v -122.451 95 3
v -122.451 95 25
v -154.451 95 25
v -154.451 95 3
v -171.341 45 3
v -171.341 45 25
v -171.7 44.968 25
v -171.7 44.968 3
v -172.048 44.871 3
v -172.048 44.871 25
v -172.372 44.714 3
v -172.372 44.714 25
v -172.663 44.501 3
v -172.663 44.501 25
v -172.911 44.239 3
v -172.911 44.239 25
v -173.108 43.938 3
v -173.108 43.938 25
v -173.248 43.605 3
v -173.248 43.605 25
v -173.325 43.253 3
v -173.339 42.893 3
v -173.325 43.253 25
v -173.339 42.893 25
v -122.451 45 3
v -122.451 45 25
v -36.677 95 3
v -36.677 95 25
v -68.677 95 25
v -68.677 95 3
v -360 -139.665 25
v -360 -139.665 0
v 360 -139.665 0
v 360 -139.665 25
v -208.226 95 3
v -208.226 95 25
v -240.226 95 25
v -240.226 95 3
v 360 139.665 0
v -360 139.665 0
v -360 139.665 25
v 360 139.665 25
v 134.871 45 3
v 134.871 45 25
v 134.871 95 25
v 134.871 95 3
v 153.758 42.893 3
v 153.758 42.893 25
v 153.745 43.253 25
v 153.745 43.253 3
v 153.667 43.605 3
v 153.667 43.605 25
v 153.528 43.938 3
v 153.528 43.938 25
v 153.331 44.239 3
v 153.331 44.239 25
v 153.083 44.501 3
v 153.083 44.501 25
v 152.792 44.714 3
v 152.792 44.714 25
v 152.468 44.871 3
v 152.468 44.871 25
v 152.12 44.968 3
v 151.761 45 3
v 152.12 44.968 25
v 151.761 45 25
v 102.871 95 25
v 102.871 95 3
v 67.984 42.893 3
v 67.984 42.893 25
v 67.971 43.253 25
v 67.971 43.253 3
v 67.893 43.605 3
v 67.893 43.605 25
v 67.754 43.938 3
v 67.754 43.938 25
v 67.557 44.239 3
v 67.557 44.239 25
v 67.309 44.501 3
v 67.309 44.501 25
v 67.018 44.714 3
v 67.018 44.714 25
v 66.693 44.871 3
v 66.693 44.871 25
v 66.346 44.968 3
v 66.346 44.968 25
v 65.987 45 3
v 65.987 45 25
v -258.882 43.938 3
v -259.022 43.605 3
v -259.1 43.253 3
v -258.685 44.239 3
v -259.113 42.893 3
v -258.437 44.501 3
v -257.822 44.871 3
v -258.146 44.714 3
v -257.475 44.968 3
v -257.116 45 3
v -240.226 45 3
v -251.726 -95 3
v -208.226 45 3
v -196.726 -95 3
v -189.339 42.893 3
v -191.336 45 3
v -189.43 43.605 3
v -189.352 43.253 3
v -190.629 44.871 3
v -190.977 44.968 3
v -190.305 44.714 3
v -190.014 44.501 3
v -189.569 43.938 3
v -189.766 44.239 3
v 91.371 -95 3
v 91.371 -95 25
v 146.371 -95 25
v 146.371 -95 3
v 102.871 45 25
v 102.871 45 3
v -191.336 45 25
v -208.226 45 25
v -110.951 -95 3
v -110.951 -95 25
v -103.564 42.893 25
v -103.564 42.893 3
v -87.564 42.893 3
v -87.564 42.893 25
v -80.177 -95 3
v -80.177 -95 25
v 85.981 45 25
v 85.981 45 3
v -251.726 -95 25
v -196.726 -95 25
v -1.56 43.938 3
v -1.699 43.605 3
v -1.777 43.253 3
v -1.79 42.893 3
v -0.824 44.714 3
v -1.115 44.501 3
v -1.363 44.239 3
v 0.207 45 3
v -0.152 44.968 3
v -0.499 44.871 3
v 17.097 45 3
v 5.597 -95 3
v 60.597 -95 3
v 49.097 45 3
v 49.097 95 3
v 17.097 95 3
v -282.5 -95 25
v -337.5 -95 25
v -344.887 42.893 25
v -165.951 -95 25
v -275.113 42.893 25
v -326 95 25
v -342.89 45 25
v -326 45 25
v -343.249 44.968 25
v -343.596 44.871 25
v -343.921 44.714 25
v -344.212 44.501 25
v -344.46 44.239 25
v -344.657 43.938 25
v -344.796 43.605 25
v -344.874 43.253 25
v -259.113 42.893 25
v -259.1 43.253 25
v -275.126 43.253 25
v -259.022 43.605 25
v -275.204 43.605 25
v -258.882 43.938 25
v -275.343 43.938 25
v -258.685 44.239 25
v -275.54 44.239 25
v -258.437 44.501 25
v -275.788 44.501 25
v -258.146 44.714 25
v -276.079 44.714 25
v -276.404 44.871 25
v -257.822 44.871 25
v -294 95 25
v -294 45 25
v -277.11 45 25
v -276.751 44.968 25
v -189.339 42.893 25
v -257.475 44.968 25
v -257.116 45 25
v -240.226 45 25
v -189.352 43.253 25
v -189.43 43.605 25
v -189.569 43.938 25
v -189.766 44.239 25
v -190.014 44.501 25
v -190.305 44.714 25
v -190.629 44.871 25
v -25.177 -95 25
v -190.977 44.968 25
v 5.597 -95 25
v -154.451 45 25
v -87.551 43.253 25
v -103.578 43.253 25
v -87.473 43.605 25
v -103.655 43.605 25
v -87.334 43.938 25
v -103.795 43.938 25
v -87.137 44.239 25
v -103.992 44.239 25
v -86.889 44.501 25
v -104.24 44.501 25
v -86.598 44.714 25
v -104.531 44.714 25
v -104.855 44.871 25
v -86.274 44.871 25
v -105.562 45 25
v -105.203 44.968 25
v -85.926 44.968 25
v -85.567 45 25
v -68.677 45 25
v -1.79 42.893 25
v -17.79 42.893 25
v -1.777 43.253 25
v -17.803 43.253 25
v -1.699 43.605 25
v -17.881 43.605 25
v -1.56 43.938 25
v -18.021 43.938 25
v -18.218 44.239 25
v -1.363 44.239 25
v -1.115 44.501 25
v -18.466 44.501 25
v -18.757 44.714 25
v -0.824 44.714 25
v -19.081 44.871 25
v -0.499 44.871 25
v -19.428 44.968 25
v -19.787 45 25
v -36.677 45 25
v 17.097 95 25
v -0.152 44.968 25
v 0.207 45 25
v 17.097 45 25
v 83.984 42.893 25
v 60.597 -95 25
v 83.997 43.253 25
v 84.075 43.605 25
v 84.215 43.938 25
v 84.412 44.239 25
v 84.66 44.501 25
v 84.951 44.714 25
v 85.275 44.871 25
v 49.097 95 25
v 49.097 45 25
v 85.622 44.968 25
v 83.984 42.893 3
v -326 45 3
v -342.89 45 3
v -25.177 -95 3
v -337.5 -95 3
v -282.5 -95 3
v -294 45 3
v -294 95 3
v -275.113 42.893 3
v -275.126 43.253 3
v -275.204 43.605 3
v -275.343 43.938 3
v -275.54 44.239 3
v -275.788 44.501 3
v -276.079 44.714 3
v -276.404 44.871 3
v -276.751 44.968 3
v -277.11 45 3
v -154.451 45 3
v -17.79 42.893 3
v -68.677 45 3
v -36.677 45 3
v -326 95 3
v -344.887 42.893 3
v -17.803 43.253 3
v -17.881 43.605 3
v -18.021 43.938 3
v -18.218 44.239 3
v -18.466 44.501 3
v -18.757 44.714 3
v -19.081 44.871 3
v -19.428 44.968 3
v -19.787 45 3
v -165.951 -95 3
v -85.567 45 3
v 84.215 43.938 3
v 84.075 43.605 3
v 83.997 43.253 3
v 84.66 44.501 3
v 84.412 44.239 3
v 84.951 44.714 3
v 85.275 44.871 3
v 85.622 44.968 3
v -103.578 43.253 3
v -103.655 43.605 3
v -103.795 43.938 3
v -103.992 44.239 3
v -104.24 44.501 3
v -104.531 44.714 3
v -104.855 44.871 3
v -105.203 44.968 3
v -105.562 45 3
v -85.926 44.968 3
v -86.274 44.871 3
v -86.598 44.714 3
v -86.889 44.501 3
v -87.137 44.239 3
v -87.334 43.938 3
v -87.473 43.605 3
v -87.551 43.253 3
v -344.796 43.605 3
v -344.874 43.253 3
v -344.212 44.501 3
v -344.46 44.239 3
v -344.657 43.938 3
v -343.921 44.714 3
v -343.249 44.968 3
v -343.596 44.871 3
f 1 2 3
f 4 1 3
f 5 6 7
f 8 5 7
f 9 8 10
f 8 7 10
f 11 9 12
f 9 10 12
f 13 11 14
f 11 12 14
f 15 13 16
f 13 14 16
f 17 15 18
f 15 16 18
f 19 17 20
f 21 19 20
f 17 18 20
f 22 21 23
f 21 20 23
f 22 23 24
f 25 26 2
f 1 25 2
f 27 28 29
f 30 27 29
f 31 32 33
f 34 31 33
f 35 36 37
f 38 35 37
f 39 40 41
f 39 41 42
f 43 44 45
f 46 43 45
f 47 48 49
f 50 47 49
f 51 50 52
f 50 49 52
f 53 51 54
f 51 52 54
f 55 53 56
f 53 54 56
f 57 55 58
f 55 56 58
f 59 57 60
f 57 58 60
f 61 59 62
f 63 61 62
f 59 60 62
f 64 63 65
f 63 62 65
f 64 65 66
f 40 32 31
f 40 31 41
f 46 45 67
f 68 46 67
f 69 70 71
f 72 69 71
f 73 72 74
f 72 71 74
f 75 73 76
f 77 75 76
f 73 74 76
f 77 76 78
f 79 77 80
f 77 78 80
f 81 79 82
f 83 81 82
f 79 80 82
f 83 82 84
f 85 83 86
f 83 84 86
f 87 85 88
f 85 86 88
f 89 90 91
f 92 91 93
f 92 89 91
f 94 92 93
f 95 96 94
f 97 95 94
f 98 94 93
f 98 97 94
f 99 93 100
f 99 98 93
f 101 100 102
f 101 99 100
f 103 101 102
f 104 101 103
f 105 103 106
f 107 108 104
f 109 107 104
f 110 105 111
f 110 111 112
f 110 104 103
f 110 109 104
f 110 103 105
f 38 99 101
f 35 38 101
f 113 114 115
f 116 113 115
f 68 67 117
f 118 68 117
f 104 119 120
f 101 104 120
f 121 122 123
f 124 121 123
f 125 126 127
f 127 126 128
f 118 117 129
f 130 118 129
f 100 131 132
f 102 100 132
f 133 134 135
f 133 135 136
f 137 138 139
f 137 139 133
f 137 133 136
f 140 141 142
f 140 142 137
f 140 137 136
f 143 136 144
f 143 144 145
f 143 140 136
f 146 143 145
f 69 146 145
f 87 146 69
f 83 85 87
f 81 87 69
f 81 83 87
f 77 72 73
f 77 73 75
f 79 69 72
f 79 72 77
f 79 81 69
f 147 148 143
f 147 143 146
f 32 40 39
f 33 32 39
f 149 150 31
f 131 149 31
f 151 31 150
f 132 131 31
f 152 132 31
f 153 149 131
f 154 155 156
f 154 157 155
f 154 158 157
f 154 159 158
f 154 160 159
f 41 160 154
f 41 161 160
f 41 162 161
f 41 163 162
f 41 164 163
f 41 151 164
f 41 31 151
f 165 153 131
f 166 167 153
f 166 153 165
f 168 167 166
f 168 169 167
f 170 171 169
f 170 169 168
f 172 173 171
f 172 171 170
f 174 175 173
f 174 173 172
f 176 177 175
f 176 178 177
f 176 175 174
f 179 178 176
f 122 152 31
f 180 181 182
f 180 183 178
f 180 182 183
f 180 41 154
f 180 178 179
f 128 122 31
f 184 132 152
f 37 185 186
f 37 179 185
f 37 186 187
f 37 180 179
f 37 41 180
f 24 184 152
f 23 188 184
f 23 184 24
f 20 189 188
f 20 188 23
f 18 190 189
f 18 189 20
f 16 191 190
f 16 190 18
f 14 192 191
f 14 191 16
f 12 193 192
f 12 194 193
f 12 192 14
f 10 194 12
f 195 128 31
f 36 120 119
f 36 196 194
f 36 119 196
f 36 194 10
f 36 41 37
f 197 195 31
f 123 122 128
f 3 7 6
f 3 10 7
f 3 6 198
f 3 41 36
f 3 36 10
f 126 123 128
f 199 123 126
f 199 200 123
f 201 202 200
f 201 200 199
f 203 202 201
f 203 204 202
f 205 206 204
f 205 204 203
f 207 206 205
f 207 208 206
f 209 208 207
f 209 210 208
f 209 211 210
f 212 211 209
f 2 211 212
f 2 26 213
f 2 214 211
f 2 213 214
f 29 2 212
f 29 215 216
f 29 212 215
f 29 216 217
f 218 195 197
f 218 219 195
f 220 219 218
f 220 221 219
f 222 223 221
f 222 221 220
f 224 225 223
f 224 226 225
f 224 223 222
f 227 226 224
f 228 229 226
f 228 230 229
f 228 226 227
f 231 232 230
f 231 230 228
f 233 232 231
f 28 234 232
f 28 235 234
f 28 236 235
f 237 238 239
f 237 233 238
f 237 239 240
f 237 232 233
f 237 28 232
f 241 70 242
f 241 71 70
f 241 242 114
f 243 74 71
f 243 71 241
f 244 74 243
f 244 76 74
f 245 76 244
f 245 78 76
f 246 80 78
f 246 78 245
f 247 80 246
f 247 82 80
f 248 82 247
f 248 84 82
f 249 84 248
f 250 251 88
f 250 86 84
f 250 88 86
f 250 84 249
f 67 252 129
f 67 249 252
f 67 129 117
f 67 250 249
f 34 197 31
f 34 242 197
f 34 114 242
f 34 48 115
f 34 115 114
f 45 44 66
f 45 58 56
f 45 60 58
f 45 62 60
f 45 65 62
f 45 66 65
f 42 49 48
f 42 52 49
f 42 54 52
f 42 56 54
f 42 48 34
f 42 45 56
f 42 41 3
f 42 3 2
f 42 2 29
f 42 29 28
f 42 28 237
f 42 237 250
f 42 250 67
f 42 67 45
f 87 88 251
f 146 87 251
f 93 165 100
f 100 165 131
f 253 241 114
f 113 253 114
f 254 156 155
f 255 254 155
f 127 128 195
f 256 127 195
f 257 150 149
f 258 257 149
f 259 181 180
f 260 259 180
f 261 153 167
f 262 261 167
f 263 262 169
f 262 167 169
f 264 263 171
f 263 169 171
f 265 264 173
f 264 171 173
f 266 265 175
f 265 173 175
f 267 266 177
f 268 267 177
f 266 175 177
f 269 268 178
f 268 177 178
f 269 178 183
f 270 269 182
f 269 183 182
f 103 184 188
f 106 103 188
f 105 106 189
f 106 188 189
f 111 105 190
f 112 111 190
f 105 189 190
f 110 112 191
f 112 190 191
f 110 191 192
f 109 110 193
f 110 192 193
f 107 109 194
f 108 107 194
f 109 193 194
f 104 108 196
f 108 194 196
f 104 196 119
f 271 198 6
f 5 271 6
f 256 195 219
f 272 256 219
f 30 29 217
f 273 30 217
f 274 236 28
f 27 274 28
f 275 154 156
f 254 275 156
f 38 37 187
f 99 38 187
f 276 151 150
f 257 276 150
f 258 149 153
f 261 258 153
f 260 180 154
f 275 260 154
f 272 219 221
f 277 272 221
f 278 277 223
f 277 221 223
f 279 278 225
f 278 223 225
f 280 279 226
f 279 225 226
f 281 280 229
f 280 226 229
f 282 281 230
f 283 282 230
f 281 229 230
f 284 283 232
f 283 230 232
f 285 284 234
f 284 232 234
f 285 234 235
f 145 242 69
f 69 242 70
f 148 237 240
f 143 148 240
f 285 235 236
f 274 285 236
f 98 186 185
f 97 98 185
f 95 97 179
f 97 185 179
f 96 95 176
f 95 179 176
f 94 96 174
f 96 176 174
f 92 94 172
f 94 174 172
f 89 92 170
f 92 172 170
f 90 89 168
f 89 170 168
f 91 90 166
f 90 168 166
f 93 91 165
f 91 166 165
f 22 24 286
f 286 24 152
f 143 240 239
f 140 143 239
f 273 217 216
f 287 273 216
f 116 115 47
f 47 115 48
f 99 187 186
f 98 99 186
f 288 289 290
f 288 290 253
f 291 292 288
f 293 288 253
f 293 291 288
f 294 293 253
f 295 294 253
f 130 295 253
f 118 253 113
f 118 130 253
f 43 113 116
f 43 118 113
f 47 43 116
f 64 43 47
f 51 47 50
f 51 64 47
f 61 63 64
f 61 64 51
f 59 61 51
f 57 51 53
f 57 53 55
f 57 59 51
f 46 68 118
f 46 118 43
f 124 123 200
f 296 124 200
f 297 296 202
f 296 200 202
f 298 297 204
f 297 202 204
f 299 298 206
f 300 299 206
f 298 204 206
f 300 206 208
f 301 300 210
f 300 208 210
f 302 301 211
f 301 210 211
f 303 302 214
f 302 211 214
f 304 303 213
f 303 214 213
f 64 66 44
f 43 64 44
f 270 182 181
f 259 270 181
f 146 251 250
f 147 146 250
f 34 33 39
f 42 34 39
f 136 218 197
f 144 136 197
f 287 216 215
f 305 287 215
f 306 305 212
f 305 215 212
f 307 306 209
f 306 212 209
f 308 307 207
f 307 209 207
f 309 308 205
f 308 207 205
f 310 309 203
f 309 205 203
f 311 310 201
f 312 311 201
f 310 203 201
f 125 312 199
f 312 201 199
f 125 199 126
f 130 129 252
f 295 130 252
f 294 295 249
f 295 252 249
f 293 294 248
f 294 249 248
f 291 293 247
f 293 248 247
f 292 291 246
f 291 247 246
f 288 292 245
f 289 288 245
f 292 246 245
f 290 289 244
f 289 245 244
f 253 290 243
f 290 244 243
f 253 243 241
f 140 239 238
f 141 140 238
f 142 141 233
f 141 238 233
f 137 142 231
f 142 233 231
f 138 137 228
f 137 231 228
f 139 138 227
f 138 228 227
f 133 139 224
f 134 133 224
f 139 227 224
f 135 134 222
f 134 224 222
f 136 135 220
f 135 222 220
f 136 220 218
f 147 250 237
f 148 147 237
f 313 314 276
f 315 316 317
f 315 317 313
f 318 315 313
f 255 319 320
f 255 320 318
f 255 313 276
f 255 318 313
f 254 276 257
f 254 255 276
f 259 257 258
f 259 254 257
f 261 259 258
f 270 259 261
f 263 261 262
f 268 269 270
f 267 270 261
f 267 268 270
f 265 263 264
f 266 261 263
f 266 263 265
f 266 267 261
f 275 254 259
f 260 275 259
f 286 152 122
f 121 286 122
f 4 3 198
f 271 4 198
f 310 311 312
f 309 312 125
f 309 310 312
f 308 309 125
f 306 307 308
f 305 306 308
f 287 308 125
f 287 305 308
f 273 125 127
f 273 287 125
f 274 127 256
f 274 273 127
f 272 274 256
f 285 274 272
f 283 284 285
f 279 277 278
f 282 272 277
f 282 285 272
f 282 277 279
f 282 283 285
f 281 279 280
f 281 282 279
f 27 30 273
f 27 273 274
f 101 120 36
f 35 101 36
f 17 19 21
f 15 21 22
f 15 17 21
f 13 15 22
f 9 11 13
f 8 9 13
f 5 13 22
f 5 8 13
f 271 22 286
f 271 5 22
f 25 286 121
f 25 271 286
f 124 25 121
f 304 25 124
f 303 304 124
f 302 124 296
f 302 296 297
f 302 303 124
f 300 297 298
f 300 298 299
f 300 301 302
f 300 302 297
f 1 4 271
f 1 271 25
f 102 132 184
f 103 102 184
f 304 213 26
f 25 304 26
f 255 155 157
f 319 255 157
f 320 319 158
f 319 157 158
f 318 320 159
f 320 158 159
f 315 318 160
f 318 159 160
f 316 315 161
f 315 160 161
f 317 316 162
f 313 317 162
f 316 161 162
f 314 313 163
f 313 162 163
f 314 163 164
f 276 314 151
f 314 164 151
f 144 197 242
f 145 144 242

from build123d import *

# Parameters (mm, degrees)
SKETCH2_W           = 720
SKETCH2_H           = 279.33
BOSS_EXTRUDE1_DEPTH = 25
CUT_EXTRUDE1_DEPTH  = 22


with BuildPart() as part:
    # Sketch2 → Boss-Extrude1 (new body)
    with BuildSketch(Plane.XY):
        Rectangle(SKETCH2_W, SKETCH2_H)
    extrude(amount=BOSS_EXTRUDE1_DEPTH)

    # Sketch4 → Cut-Extrude1 (cut)
    with BuildSketch(Plane.XY.offset(25)):
        with BuildLine():
            Line((-326, 45), (-342.889989301, 45))
            ThreePointArc((-342.889989301, 45), (-344.341536559, 44.375867202), (-344.887125566, 42.893010557))
            Line((-344.887125566, 42.893010557), (-337.5, -95))
            Line((-337.5, -95), (-282.5, -95))
            Line((-282.5, -95), (-275.112874434, 42.893010557))
            ThreePointArc((-275.112874434, 42.893010557), (-275.658463441, 44.375867202), (-277.110010699, 45))
            Line((-277.110010699, 45), (-294, 45))
            Line((-294, 45), (-294, 95))
            Line((-294, 95), (-326, 95))
            Line((-326, 95), (-326, 45))
        make_face()
        with BuildLine():
            Line((-110.951497738, -95), (-103.564372172, 42.893010557))
            ThreePointArc((-103.564372172, 42.893010557), (-104.109961179, 44.375867202), (-105.561508437, 45))
            Line((-105.561508437, 45), (-122.451497738, 45))
            Line((-122.451497738, 45), (-122.451497738, 95))
            Line((-122.451497738, 95), (-154.451497738, 95))
            Line((-154.451497738, 95), (-154.451497738, 45))
            Line((-154.451497738, 45), (-171.341487039, 45))
            ThreePointArc((-171.341487039, 45), (-172.793034297, 44.375867202), (-173.338623303, 42.893010557))
            Line((-173.338623303, 42.893010557), (-165.951497738, -95))
            Line((-165.951497738, -95), (-110.951497738, -95))
        make_face()
        with BuildLine():
            Line((-259.112874434, 42.893010557), (-251.725748869, -95))
            Line((-251.725748869, -95), (-196.725748869, -95))
            Line((-196.725748869, -95), (-189.338623303, 42.893010557))
            ThreePointArc((-189.338623303, 42.893010557), (-189.88421231, 44.375867202), (-191.335759568, 45))
            Line((-191.335759568, 45), (-208.225748869, 45))
            Line((-208.225748869, 45), (-208.225748869, 95))
            Line((-208.225748869, 95), (-240.225748869, 95))
            Line((-240.225748869, 95), (-240.225748869, 45))
            Line((-240.225748869, 45), (-257.11573817, 45))
            ThreePointArc((-257.11573817, 45), (-258.567285428, 44.375867202), (-259.112874434, 42.893010557))
        make_face()
        with BuildLine():
            Line((-25.177246607, -95), (-17.790121041, 42.893010557))
            ThreePointArc((-17.790121041, 42.893010557), (-18.335710047, 44.375867202), (-19.787257306, 45))
            Line((-19.787257306, 45), (-36.677246607, 45))
            Line((-36.677246607, 45), (-36.677246607, 95))
            Line((-36.677246607, 95), (-68.677246607, 95))
            Line((-68.677246607, 95), (-68.677246607, 45))
            Line((-68.677246607, 45), (-85.567235908, 45))
            ThreePointArc((-85.567235908, 45), (-87.018783166, 44.375867202), (-87.564372172, 42.893010557))
            Line((-87.564372172, 42.893010557), (-80.177246607, -95))
            Line((-80.177246607, -95), (-25.177246607, -95))
        make_face()
        with BuildLine():
            Line((60.597004525, -95), (67.98413009, 42.893010557))
            ThreePointArc((67.98413009, 42.893010557), (67.438541084, 44.375867202), (65.986993826, 45))
            Line((65.986993826, 45), (49.097004525, 45))
            Line((49.097004525, 45), (49.097004525, 95))
            Line((49.097004525, 95), (17.097004525, 95))
            Line((17.097004525, 95), (17.097004525, 45))
            Line((17.097004525, 45), (0.207015224, 45))
            ThreePointArc((0.207015224, 45), (-1.244532035, 44.375867202), (-1.790121041, 42.893010557))
            Line((-1.790121041, 42.893010557), (5.597004525, -95))
            Line((5.597004525, -95), (60.597004525, -95))
        make_face()
        with BuildLine():
            Line((83.98413009, 42.893010557), (91.371255656, -95))
            Line((91.371255656, -95), (146.371255656, -95))
            Line((146.371255656, -95), (153.758381221, 42.893010557))
            ThreePointArc((153.758381221, 42.893010557), (153.212792215, 44.375867202), (151.761244957, 45))
            Line((151.761244957, 45), (134.871255656, 45))
            Line((134.871255656, 45), (134.871255656, 95))
            Line((134.871255656, 95), (102.871255656, 95))
            Line((102.871255656, 95), (102.871255656, 45))
            Line((102.871255656, 45), (85.981266355, 45))
            ThreePointArc((85.981266355, 45), (84.529719096, 44.375867202), (83.98413009, 42.893010557))
        make_face()
    extrude(amount=-CUT_EXTRUDE1_DEPTH, mode=Mode.SUBTRACT)


solid = part.part
